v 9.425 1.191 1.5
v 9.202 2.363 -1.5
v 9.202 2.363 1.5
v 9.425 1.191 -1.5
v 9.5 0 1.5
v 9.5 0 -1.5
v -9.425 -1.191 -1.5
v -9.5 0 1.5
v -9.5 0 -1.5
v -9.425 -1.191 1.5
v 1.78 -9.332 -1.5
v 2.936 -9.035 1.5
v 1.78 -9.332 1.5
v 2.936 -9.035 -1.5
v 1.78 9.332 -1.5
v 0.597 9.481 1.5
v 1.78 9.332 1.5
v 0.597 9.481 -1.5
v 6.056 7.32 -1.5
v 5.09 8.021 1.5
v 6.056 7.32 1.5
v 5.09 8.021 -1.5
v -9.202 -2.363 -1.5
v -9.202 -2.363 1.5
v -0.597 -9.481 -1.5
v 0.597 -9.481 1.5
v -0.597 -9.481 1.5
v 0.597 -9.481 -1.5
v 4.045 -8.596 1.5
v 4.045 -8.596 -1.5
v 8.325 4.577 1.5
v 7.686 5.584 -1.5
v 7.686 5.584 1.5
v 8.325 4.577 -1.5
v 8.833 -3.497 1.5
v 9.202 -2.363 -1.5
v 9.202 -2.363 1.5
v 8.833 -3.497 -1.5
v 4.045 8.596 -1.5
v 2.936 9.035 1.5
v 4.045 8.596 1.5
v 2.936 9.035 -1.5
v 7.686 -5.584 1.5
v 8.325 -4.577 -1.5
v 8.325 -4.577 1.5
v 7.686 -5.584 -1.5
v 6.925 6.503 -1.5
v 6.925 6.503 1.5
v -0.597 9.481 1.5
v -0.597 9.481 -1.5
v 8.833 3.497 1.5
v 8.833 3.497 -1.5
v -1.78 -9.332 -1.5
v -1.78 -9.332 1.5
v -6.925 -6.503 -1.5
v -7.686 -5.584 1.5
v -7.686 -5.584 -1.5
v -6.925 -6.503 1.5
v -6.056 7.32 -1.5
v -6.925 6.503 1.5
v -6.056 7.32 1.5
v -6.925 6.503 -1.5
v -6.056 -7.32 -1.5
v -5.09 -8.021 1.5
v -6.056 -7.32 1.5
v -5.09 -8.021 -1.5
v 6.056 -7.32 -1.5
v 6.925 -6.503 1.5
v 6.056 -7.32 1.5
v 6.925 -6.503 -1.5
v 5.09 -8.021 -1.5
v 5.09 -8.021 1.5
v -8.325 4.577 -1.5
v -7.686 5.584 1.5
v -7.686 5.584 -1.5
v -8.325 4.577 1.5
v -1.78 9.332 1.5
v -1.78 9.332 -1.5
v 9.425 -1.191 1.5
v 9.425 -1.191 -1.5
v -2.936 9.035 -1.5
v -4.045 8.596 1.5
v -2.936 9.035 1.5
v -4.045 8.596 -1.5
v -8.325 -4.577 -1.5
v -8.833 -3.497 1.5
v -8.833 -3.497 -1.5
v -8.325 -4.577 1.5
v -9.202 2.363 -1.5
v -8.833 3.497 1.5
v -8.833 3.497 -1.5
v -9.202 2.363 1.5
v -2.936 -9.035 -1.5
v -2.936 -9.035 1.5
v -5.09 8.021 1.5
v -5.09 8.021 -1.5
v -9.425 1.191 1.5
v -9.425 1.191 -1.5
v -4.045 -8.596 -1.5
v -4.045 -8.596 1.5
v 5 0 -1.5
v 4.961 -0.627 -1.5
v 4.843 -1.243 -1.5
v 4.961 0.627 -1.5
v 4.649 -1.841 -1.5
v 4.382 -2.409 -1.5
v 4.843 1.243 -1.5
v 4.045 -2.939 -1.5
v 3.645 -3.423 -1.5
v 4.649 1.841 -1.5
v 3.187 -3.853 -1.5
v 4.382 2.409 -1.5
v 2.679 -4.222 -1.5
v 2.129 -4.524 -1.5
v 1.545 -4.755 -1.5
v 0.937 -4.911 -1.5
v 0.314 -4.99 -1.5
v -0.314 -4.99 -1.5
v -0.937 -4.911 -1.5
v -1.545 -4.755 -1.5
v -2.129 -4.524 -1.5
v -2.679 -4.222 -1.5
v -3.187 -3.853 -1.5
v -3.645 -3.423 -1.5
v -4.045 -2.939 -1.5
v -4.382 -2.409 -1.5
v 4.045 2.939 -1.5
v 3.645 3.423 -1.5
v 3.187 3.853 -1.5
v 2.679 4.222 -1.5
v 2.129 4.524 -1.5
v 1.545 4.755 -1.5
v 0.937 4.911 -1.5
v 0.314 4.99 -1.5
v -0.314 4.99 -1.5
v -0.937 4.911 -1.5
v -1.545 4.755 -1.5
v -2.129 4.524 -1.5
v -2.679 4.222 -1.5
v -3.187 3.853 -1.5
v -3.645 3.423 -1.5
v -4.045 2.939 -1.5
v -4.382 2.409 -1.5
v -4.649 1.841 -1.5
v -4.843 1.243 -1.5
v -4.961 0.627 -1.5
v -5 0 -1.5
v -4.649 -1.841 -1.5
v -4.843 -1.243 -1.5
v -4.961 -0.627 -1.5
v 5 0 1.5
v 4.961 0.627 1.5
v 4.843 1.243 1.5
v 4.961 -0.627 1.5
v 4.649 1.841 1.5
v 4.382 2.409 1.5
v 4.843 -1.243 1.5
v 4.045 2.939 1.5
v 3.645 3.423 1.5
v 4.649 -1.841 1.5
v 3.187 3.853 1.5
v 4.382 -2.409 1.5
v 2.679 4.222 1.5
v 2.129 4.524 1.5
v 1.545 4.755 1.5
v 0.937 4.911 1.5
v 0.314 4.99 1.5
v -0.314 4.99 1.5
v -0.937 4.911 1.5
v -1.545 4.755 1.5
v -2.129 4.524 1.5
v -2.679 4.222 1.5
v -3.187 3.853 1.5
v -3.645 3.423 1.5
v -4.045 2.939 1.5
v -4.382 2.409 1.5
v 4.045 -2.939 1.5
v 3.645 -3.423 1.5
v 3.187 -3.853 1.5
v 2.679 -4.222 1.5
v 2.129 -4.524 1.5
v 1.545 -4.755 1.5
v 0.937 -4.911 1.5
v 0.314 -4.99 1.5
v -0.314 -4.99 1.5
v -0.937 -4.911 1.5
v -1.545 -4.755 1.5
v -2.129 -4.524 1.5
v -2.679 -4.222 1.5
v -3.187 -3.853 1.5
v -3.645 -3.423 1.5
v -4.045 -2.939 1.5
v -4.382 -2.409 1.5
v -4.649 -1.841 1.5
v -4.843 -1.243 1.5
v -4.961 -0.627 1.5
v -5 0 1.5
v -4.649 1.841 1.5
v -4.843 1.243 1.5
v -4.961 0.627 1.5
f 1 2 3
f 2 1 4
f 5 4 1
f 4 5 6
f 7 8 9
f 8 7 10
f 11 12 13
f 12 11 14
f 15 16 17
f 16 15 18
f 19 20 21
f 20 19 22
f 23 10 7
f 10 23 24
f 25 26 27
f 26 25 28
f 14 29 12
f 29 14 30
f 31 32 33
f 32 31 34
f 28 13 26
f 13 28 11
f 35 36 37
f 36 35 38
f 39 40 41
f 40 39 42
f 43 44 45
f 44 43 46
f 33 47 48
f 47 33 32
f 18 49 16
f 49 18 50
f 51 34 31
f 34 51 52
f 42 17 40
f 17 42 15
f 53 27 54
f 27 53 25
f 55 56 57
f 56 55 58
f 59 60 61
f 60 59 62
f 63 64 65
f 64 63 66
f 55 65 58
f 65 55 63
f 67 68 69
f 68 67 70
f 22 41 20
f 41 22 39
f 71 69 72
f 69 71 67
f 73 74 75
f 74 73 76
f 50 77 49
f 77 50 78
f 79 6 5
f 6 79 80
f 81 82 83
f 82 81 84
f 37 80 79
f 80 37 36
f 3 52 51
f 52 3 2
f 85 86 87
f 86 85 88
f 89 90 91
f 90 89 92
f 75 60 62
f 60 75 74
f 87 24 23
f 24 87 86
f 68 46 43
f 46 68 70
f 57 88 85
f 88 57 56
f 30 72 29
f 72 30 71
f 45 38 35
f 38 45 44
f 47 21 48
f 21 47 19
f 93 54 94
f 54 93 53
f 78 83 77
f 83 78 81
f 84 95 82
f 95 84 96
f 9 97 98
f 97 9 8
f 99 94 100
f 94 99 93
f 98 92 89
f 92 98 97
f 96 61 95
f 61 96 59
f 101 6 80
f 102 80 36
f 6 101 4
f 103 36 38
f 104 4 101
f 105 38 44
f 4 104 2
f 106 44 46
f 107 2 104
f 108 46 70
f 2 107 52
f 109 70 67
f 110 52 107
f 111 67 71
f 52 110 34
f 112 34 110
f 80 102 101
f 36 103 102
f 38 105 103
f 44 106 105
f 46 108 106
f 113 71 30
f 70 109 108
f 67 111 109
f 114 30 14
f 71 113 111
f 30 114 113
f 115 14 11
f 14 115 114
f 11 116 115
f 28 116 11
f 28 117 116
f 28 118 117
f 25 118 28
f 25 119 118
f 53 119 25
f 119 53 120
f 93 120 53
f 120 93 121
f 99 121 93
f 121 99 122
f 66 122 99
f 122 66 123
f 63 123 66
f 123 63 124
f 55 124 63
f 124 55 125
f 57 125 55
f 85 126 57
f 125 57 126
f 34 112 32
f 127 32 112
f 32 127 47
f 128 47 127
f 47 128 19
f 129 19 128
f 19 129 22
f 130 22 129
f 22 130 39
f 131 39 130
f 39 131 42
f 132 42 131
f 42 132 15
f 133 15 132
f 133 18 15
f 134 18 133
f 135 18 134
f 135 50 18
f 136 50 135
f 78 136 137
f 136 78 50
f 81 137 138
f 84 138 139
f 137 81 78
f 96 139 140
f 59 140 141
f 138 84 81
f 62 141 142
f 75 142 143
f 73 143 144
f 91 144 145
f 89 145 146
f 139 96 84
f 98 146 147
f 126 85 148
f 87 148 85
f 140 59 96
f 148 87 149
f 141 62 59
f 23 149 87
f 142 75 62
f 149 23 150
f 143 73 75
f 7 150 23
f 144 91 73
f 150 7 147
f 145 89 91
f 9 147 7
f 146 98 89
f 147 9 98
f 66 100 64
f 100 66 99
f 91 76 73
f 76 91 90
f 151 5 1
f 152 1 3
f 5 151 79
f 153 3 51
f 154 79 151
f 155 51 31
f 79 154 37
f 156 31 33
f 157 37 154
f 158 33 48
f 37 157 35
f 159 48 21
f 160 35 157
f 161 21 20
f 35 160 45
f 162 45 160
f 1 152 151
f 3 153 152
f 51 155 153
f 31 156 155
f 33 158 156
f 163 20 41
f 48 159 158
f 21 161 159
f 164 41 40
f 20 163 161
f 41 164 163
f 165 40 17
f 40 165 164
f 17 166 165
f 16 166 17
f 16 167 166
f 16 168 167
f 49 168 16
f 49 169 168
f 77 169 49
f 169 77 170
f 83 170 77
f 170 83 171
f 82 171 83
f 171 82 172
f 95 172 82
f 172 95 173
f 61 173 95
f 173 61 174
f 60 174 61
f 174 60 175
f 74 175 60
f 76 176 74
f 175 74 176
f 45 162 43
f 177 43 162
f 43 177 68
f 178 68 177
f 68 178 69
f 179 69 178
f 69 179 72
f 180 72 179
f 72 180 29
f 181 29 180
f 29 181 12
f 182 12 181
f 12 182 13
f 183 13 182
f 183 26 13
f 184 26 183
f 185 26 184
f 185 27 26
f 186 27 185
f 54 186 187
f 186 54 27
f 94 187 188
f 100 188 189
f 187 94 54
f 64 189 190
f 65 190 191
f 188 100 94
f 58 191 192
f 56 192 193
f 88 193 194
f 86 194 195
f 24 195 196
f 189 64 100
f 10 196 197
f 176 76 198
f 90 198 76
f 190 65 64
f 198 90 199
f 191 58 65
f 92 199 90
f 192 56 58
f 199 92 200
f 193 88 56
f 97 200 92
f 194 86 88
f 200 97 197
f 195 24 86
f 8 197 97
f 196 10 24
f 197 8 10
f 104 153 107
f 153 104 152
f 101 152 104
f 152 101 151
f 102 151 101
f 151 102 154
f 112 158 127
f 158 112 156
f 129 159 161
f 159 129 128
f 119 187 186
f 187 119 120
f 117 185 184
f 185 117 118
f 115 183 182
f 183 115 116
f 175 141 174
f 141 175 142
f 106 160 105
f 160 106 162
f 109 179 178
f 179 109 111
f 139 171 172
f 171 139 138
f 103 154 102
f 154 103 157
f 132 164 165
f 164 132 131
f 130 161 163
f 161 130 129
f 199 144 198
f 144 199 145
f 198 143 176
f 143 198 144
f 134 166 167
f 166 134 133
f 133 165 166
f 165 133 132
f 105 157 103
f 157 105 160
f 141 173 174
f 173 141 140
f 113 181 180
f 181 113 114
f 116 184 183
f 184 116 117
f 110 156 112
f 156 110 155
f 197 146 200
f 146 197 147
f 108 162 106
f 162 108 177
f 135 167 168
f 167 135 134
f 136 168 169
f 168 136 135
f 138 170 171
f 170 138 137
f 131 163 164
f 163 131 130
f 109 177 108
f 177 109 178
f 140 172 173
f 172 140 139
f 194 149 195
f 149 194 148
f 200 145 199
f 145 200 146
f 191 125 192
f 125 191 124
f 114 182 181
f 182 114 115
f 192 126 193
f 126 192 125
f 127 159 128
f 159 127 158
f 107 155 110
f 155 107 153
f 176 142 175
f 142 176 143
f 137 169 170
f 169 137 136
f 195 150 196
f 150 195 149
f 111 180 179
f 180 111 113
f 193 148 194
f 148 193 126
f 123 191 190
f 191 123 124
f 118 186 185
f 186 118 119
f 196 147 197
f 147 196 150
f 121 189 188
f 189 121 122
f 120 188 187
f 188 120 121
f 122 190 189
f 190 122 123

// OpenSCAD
$fn = 50;


difference() {
	union() {
		translate(v = [0, 0, -1.5000000000]) {
			cylinder(h = 3, r = 9.5000000000);
		}
	}
	union() {
		translate(v = [0, 0, -100.0000000000]) {
			cylinder(h = 200, r = 5.0000000000);
		}
	}
}
